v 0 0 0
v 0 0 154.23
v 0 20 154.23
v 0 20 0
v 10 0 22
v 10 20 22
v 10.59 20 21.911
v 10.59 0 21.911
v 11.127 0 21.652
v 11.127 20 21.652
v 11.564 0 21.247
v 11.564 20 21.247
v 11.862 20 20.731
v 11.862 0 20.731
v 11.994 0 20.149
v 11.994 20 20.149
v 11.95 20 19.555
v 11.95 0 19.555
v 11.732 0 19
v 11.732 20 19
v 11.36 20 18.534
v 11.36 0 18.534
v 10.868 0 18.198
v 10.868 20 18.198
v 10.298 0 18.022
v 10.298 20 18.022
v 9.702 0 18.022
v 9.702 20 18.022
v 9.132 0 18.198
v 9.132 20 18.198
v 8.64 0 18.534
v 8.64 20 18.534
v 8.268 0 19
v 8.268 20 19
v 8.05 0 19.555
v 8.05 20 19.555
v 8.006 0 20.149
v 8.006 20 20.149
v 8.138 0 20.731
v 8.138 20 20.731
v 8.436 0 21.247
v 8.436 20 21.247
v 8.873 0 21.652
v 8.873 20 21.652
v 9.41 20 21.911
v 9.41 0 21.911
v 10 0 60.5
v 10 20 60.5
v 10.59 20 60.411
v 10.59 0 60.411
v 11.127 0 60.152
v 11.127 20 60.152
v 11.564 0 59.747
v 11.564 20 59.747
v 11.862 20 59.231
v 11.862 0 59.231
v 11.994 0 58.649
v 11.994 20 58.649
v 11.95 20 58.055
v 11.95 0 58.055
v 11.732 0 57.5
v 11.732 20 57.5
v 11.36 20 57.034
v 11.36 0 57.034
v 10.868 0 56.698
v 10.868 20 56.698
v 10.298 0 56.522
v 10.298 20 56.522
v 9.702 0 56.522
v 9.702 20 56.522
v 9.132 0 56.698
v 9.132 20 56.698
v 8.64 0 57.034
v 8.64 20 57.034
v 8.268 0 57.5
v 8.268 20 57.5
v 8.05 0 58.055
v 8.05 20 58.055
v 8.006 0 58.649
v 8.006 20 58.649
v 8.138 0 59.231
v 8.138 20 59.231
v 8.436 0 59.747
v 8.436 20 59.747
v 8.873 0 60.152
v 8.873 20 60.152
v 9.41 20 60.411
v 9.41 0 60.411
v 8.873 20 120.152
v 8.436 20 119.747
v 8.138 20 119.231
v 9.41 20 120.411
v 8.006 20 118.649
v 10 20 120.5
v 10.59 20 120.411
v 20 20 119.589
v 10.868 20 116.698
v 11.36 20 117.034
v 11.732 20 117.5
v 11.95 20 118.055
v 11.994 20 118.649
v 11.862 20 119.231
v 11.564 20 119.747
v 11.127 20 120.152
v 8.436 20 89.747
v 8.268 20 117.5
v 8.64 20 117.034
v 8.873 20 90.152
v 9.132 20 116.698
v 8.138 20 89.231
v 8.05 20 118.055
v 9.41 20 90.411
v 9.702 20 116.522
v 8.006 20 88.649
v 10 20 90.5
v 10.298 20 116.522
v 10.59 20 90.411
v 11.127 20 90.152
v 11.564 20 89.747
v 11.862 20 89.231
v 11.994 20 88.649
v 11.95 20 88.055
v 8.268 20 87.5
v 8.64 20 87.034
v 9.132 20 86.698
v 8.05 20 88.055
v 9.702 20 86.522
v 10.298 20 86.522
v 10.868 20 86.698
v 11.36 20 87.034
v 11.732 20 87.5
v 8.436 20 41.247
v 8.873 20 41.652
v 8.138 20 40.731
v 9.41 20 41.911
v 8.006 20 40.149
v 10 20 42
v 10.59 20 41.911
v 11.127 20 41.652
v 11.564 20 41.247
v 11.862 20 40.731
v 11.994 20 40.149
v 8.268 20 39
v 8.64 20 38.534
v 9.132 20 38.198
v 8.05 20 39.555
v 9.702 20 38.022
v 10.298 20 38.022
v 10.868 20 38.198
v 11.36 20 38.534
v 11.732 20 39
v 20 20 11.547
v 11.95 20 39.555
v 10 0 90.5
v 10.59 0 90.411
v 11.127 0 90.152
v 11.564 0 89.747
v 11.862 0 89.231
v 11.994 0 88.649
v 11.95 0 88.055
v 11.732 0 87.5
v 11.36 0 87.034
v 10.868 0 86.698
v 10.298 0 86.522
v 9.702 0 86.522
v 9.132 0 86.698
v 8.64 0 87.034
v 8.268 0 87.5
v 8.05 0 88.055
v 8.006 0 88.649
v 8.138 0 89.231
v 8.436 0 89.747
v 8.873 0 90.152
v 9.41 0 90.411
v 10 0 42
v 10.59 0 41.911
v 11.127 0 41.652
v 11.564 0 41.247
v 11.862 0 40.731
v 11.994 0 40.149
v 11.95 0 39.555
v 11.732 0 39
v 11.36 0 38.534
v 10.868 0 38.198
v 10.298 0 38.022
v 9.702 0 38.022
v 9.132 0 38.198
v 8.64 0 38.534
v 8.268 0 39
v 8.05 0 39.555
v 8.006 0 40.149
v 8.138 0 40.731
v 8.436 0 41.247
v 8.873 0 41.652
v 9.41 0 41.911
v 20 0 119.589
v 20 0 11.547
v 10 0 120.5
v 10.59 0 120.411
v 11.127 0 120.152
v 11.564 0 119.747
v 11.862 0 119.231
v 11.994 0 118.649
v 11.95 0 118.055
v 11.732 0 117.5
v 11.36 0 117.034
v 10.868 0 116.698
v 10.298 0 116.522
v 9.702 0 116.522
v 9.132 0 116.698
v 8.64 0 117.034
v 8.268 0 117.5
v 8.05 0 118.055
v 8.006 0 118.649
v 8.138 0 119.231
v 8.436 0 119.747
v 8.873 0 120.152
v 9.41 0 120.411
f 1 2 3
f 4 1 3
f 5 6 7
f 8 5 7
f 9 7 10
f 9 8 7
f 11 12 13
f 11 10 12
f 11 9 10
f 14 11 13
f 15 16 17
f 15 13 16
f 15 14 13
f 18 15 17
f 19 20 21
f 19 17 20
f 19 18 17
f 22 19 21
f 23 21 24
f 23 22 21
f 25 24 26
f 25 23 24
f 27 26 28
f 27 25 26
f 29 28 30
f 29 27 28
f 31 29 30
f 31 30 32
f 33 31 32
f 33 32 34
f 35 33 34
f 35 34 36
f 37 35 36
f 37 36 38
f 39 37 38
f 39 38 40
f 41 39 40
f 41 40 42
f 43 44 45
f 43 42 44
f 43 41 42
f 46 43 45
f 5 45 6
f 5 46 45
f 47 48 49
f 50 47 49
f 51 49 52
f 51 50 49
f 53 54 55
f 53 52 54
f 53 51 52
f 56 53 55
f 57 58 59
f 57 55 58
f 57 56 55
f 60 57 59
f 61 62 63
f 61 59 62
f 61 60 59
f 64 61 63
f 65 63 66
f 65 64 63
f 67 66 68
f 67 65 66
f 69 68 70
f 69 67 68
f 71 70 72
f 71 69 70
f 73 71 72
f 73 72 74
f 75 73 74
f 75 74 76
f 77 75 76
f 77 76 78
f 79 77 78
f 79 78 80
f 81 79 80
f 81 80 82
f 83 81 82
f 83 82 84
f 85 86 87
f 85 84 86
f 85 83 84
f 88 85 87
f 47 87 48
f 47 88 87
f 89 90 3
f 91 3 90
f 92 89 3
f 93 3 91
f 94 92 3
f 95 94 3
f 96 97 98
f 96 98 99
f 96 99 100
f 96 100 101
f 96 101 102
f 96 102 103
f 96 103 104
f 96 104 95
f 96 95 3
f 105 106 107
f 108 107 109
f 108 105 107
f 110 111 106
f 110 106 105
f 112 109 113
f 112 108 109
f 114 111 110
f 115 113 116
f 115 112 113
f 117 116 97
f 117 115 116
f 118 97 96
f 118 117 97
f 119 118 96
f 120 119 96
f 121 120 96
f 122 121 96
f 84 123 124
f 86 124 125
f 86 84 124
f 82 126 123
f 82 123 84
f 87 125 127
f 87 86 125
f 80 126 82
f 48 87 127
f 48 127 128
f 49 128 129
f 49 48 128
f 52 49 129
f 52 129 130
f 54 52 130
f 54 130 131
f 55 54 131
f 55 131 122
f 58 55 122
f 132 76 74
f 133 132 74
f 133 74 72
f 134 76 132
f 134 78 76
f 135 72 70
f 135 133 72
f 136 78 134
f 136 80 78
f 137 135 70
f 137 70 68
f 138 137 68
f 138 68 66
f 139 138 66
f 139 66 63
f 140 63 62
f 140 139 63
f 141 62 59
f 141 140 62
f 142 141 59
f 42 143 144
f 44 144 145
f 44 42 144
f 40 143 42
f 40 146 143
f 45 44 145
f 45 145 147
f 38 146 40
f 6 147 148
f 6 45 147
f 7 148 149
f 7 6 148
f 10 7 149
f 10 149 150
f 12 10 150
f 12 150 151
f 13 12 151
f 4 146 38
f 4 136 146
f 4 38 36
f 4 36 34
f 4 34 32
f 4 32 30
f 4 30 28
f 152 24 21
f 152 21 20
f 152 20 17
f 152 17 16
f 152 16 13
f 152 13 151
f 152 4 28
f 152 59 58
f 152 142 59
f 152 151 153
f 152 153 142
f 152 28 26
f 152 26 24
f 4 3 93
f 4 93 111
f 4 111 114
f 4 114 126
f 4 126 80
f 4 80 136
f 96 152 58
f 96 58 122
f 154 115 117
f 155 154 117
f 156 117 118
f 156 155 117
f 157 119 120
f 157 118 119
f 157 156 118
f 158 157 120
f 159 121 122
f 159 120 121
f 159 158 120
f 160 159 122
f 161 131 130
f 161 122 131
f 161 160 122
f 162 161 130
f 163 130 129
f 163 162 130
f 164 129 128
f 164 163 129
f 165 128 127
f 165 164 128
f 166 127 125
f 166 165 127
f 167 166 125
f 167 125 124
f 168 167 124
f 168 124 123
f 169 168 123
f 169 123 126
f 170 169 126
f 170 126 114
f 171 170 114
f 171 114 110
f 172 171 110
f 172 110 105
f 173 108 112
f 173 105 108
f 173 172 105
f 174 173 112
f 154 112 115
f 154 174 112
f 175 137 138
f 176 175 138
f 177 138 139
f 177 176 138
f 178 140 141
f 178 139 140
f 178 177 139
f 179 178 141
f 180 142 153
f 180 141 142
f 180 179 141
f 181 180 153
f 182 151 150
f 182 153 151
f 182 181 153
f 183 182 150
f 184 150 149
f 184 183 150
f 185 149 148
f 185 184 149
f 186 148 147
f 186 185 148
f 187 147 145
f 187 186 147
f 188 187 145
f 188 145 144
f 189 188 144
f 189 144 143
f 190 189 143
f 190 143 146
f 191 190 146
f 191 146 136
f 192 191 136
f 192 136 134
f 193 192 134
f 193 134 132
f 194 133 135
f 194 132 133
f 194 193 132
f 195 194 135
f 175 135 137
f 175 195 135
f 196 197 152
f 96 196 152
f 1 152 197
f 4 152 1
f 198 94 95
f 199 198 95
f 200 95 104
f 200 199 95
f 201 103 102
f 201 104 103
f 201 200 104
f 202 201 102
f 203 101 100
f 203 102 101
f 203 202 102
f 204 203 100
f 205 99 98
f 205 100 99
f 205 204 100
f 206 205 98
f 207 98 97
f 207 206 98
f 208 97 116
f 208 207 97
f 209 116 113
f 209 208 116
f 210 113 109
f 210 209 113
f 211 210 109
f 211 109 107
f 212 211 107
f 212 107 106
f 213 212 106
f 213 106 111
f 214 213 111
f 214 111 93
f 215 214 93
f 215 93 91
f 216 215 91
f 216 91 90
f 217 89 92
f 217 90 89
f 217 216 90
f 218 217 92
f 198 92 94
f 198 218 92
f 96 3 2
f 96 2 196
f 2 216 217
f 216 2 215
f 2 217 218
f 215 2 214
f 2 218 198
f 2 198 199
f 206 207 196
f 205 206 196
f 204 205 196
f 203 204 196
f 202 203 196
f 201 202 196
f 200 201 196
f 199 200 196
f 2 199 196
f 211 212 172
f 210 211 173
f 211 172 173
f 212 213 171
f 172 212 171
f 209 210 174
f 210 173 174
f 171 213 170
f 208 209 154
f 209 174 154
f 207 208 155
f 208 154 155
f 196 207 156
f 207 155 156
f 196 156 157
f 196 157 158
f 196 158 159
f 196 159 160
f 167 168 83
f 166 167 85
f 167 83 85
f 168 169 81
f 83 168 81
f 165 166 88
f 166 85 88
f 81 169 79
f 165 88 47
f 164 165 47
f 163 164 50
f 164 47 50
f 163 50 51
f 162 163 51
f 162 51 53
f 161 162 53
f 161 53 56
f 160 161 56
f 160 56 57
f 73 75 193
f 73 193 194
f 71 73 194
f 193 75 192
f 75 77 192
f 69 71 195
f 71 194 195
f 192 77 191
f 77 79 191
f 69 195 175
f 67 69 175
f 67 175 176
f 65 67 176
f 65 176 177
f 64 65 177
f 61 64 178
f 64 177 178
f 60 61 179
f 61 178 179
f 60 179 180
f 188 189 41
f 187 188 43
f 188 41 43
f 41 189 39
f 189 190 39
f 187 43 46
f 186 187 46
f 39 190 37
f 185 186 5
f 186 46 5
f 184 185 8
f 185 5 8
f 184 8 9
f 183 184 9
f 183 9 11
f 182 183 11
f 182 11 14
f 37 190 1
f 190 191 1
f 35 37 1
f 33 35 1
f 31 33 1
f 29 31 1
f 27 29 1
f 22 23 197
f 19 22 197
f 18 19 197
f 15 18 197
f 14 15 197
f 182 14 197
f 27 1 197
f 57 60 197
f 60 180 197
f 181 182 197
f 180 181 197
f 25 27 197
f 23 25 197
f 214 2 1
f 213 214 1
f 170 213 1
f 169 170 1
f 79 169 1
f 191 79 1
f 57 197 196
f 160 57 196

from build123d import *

# Parameters (mm, degrees)
SKETCH_1_W               = 20
SKETCH_1_H               = 20
EXTRUDE_1_DEPTH          = 154.23
CUT_EXTRUDE_1_DEPTH      = 154.23
CUT_EXTRUDE_2_DEPTH      = 157.802081938
CUT_EXTRUDE_2_DEPTH_BACK = 157.802081938
SKETCH_3_R               = 2


with BuildPart() as part:
    # 草图1 → 凸台-拉伸1 (new body)
    with BuildSketch(Plane.XY):
        with Locations((10, 10)):
            Rectangle(SKETCH_1_W, SKETCH_1_H)
    extrude(amount=EXTRUDE_1_DEPTH)

    # 草图2 → 切除-拉伸1 (cut)
    with BuildSketch(Plane(origin=(0, 20, 0), x_dir=(1, 0, 0), z_dir=(0, 1, 0))):
        Polygon((0, -154.23), (20, -119.588983849), (20, -154.23), align=None)
        Polygon((20, -11.547005384), (0, 0), (20, 0), align=None)
    extrude(amount=-CUT_EXTRUDE_1_DEPTH, mode=Mode.SUBTRACT)

    # 草图3 → 切除-拉伸2 (cut, two sides: drawn at the far end of the back side and taken through both)
    with BuildSketch(Plane(origin=(0, 20, 0), x_dir=(1, 0, 0), z_dir=(0, 1, 0)).offset(-CUT_EXTRUDE_2_DEPTH_BACK)):
        with Locations(Location((10, -88.5, 0), (0, 0, 270))):
            Circle(SKETCH_3_R)
        with Locations(Location((10, -118.5, 0), (0, 0, 270))):
            Circle(SKETCH_3_R)
        with Locations(Location((10, -58.5, 0), (0, 0, 270))):
            Circle(SKETCH_3_R)
        with Locations(Location((10, -20, 0), (0, 0, 270))):
            Circle(SKETCH_3_R)
        with Locations(Location((10, -40, 0), (0, 0, 270))):
            Circle(SKETCH_3_R)
    extrude(amount=CUT_EXTRUDE_2_DEPTH + CUT_EXTRUDE_2_DEPTH_BACK, mode=Mode.SUBTRACT)


solid = part.part
